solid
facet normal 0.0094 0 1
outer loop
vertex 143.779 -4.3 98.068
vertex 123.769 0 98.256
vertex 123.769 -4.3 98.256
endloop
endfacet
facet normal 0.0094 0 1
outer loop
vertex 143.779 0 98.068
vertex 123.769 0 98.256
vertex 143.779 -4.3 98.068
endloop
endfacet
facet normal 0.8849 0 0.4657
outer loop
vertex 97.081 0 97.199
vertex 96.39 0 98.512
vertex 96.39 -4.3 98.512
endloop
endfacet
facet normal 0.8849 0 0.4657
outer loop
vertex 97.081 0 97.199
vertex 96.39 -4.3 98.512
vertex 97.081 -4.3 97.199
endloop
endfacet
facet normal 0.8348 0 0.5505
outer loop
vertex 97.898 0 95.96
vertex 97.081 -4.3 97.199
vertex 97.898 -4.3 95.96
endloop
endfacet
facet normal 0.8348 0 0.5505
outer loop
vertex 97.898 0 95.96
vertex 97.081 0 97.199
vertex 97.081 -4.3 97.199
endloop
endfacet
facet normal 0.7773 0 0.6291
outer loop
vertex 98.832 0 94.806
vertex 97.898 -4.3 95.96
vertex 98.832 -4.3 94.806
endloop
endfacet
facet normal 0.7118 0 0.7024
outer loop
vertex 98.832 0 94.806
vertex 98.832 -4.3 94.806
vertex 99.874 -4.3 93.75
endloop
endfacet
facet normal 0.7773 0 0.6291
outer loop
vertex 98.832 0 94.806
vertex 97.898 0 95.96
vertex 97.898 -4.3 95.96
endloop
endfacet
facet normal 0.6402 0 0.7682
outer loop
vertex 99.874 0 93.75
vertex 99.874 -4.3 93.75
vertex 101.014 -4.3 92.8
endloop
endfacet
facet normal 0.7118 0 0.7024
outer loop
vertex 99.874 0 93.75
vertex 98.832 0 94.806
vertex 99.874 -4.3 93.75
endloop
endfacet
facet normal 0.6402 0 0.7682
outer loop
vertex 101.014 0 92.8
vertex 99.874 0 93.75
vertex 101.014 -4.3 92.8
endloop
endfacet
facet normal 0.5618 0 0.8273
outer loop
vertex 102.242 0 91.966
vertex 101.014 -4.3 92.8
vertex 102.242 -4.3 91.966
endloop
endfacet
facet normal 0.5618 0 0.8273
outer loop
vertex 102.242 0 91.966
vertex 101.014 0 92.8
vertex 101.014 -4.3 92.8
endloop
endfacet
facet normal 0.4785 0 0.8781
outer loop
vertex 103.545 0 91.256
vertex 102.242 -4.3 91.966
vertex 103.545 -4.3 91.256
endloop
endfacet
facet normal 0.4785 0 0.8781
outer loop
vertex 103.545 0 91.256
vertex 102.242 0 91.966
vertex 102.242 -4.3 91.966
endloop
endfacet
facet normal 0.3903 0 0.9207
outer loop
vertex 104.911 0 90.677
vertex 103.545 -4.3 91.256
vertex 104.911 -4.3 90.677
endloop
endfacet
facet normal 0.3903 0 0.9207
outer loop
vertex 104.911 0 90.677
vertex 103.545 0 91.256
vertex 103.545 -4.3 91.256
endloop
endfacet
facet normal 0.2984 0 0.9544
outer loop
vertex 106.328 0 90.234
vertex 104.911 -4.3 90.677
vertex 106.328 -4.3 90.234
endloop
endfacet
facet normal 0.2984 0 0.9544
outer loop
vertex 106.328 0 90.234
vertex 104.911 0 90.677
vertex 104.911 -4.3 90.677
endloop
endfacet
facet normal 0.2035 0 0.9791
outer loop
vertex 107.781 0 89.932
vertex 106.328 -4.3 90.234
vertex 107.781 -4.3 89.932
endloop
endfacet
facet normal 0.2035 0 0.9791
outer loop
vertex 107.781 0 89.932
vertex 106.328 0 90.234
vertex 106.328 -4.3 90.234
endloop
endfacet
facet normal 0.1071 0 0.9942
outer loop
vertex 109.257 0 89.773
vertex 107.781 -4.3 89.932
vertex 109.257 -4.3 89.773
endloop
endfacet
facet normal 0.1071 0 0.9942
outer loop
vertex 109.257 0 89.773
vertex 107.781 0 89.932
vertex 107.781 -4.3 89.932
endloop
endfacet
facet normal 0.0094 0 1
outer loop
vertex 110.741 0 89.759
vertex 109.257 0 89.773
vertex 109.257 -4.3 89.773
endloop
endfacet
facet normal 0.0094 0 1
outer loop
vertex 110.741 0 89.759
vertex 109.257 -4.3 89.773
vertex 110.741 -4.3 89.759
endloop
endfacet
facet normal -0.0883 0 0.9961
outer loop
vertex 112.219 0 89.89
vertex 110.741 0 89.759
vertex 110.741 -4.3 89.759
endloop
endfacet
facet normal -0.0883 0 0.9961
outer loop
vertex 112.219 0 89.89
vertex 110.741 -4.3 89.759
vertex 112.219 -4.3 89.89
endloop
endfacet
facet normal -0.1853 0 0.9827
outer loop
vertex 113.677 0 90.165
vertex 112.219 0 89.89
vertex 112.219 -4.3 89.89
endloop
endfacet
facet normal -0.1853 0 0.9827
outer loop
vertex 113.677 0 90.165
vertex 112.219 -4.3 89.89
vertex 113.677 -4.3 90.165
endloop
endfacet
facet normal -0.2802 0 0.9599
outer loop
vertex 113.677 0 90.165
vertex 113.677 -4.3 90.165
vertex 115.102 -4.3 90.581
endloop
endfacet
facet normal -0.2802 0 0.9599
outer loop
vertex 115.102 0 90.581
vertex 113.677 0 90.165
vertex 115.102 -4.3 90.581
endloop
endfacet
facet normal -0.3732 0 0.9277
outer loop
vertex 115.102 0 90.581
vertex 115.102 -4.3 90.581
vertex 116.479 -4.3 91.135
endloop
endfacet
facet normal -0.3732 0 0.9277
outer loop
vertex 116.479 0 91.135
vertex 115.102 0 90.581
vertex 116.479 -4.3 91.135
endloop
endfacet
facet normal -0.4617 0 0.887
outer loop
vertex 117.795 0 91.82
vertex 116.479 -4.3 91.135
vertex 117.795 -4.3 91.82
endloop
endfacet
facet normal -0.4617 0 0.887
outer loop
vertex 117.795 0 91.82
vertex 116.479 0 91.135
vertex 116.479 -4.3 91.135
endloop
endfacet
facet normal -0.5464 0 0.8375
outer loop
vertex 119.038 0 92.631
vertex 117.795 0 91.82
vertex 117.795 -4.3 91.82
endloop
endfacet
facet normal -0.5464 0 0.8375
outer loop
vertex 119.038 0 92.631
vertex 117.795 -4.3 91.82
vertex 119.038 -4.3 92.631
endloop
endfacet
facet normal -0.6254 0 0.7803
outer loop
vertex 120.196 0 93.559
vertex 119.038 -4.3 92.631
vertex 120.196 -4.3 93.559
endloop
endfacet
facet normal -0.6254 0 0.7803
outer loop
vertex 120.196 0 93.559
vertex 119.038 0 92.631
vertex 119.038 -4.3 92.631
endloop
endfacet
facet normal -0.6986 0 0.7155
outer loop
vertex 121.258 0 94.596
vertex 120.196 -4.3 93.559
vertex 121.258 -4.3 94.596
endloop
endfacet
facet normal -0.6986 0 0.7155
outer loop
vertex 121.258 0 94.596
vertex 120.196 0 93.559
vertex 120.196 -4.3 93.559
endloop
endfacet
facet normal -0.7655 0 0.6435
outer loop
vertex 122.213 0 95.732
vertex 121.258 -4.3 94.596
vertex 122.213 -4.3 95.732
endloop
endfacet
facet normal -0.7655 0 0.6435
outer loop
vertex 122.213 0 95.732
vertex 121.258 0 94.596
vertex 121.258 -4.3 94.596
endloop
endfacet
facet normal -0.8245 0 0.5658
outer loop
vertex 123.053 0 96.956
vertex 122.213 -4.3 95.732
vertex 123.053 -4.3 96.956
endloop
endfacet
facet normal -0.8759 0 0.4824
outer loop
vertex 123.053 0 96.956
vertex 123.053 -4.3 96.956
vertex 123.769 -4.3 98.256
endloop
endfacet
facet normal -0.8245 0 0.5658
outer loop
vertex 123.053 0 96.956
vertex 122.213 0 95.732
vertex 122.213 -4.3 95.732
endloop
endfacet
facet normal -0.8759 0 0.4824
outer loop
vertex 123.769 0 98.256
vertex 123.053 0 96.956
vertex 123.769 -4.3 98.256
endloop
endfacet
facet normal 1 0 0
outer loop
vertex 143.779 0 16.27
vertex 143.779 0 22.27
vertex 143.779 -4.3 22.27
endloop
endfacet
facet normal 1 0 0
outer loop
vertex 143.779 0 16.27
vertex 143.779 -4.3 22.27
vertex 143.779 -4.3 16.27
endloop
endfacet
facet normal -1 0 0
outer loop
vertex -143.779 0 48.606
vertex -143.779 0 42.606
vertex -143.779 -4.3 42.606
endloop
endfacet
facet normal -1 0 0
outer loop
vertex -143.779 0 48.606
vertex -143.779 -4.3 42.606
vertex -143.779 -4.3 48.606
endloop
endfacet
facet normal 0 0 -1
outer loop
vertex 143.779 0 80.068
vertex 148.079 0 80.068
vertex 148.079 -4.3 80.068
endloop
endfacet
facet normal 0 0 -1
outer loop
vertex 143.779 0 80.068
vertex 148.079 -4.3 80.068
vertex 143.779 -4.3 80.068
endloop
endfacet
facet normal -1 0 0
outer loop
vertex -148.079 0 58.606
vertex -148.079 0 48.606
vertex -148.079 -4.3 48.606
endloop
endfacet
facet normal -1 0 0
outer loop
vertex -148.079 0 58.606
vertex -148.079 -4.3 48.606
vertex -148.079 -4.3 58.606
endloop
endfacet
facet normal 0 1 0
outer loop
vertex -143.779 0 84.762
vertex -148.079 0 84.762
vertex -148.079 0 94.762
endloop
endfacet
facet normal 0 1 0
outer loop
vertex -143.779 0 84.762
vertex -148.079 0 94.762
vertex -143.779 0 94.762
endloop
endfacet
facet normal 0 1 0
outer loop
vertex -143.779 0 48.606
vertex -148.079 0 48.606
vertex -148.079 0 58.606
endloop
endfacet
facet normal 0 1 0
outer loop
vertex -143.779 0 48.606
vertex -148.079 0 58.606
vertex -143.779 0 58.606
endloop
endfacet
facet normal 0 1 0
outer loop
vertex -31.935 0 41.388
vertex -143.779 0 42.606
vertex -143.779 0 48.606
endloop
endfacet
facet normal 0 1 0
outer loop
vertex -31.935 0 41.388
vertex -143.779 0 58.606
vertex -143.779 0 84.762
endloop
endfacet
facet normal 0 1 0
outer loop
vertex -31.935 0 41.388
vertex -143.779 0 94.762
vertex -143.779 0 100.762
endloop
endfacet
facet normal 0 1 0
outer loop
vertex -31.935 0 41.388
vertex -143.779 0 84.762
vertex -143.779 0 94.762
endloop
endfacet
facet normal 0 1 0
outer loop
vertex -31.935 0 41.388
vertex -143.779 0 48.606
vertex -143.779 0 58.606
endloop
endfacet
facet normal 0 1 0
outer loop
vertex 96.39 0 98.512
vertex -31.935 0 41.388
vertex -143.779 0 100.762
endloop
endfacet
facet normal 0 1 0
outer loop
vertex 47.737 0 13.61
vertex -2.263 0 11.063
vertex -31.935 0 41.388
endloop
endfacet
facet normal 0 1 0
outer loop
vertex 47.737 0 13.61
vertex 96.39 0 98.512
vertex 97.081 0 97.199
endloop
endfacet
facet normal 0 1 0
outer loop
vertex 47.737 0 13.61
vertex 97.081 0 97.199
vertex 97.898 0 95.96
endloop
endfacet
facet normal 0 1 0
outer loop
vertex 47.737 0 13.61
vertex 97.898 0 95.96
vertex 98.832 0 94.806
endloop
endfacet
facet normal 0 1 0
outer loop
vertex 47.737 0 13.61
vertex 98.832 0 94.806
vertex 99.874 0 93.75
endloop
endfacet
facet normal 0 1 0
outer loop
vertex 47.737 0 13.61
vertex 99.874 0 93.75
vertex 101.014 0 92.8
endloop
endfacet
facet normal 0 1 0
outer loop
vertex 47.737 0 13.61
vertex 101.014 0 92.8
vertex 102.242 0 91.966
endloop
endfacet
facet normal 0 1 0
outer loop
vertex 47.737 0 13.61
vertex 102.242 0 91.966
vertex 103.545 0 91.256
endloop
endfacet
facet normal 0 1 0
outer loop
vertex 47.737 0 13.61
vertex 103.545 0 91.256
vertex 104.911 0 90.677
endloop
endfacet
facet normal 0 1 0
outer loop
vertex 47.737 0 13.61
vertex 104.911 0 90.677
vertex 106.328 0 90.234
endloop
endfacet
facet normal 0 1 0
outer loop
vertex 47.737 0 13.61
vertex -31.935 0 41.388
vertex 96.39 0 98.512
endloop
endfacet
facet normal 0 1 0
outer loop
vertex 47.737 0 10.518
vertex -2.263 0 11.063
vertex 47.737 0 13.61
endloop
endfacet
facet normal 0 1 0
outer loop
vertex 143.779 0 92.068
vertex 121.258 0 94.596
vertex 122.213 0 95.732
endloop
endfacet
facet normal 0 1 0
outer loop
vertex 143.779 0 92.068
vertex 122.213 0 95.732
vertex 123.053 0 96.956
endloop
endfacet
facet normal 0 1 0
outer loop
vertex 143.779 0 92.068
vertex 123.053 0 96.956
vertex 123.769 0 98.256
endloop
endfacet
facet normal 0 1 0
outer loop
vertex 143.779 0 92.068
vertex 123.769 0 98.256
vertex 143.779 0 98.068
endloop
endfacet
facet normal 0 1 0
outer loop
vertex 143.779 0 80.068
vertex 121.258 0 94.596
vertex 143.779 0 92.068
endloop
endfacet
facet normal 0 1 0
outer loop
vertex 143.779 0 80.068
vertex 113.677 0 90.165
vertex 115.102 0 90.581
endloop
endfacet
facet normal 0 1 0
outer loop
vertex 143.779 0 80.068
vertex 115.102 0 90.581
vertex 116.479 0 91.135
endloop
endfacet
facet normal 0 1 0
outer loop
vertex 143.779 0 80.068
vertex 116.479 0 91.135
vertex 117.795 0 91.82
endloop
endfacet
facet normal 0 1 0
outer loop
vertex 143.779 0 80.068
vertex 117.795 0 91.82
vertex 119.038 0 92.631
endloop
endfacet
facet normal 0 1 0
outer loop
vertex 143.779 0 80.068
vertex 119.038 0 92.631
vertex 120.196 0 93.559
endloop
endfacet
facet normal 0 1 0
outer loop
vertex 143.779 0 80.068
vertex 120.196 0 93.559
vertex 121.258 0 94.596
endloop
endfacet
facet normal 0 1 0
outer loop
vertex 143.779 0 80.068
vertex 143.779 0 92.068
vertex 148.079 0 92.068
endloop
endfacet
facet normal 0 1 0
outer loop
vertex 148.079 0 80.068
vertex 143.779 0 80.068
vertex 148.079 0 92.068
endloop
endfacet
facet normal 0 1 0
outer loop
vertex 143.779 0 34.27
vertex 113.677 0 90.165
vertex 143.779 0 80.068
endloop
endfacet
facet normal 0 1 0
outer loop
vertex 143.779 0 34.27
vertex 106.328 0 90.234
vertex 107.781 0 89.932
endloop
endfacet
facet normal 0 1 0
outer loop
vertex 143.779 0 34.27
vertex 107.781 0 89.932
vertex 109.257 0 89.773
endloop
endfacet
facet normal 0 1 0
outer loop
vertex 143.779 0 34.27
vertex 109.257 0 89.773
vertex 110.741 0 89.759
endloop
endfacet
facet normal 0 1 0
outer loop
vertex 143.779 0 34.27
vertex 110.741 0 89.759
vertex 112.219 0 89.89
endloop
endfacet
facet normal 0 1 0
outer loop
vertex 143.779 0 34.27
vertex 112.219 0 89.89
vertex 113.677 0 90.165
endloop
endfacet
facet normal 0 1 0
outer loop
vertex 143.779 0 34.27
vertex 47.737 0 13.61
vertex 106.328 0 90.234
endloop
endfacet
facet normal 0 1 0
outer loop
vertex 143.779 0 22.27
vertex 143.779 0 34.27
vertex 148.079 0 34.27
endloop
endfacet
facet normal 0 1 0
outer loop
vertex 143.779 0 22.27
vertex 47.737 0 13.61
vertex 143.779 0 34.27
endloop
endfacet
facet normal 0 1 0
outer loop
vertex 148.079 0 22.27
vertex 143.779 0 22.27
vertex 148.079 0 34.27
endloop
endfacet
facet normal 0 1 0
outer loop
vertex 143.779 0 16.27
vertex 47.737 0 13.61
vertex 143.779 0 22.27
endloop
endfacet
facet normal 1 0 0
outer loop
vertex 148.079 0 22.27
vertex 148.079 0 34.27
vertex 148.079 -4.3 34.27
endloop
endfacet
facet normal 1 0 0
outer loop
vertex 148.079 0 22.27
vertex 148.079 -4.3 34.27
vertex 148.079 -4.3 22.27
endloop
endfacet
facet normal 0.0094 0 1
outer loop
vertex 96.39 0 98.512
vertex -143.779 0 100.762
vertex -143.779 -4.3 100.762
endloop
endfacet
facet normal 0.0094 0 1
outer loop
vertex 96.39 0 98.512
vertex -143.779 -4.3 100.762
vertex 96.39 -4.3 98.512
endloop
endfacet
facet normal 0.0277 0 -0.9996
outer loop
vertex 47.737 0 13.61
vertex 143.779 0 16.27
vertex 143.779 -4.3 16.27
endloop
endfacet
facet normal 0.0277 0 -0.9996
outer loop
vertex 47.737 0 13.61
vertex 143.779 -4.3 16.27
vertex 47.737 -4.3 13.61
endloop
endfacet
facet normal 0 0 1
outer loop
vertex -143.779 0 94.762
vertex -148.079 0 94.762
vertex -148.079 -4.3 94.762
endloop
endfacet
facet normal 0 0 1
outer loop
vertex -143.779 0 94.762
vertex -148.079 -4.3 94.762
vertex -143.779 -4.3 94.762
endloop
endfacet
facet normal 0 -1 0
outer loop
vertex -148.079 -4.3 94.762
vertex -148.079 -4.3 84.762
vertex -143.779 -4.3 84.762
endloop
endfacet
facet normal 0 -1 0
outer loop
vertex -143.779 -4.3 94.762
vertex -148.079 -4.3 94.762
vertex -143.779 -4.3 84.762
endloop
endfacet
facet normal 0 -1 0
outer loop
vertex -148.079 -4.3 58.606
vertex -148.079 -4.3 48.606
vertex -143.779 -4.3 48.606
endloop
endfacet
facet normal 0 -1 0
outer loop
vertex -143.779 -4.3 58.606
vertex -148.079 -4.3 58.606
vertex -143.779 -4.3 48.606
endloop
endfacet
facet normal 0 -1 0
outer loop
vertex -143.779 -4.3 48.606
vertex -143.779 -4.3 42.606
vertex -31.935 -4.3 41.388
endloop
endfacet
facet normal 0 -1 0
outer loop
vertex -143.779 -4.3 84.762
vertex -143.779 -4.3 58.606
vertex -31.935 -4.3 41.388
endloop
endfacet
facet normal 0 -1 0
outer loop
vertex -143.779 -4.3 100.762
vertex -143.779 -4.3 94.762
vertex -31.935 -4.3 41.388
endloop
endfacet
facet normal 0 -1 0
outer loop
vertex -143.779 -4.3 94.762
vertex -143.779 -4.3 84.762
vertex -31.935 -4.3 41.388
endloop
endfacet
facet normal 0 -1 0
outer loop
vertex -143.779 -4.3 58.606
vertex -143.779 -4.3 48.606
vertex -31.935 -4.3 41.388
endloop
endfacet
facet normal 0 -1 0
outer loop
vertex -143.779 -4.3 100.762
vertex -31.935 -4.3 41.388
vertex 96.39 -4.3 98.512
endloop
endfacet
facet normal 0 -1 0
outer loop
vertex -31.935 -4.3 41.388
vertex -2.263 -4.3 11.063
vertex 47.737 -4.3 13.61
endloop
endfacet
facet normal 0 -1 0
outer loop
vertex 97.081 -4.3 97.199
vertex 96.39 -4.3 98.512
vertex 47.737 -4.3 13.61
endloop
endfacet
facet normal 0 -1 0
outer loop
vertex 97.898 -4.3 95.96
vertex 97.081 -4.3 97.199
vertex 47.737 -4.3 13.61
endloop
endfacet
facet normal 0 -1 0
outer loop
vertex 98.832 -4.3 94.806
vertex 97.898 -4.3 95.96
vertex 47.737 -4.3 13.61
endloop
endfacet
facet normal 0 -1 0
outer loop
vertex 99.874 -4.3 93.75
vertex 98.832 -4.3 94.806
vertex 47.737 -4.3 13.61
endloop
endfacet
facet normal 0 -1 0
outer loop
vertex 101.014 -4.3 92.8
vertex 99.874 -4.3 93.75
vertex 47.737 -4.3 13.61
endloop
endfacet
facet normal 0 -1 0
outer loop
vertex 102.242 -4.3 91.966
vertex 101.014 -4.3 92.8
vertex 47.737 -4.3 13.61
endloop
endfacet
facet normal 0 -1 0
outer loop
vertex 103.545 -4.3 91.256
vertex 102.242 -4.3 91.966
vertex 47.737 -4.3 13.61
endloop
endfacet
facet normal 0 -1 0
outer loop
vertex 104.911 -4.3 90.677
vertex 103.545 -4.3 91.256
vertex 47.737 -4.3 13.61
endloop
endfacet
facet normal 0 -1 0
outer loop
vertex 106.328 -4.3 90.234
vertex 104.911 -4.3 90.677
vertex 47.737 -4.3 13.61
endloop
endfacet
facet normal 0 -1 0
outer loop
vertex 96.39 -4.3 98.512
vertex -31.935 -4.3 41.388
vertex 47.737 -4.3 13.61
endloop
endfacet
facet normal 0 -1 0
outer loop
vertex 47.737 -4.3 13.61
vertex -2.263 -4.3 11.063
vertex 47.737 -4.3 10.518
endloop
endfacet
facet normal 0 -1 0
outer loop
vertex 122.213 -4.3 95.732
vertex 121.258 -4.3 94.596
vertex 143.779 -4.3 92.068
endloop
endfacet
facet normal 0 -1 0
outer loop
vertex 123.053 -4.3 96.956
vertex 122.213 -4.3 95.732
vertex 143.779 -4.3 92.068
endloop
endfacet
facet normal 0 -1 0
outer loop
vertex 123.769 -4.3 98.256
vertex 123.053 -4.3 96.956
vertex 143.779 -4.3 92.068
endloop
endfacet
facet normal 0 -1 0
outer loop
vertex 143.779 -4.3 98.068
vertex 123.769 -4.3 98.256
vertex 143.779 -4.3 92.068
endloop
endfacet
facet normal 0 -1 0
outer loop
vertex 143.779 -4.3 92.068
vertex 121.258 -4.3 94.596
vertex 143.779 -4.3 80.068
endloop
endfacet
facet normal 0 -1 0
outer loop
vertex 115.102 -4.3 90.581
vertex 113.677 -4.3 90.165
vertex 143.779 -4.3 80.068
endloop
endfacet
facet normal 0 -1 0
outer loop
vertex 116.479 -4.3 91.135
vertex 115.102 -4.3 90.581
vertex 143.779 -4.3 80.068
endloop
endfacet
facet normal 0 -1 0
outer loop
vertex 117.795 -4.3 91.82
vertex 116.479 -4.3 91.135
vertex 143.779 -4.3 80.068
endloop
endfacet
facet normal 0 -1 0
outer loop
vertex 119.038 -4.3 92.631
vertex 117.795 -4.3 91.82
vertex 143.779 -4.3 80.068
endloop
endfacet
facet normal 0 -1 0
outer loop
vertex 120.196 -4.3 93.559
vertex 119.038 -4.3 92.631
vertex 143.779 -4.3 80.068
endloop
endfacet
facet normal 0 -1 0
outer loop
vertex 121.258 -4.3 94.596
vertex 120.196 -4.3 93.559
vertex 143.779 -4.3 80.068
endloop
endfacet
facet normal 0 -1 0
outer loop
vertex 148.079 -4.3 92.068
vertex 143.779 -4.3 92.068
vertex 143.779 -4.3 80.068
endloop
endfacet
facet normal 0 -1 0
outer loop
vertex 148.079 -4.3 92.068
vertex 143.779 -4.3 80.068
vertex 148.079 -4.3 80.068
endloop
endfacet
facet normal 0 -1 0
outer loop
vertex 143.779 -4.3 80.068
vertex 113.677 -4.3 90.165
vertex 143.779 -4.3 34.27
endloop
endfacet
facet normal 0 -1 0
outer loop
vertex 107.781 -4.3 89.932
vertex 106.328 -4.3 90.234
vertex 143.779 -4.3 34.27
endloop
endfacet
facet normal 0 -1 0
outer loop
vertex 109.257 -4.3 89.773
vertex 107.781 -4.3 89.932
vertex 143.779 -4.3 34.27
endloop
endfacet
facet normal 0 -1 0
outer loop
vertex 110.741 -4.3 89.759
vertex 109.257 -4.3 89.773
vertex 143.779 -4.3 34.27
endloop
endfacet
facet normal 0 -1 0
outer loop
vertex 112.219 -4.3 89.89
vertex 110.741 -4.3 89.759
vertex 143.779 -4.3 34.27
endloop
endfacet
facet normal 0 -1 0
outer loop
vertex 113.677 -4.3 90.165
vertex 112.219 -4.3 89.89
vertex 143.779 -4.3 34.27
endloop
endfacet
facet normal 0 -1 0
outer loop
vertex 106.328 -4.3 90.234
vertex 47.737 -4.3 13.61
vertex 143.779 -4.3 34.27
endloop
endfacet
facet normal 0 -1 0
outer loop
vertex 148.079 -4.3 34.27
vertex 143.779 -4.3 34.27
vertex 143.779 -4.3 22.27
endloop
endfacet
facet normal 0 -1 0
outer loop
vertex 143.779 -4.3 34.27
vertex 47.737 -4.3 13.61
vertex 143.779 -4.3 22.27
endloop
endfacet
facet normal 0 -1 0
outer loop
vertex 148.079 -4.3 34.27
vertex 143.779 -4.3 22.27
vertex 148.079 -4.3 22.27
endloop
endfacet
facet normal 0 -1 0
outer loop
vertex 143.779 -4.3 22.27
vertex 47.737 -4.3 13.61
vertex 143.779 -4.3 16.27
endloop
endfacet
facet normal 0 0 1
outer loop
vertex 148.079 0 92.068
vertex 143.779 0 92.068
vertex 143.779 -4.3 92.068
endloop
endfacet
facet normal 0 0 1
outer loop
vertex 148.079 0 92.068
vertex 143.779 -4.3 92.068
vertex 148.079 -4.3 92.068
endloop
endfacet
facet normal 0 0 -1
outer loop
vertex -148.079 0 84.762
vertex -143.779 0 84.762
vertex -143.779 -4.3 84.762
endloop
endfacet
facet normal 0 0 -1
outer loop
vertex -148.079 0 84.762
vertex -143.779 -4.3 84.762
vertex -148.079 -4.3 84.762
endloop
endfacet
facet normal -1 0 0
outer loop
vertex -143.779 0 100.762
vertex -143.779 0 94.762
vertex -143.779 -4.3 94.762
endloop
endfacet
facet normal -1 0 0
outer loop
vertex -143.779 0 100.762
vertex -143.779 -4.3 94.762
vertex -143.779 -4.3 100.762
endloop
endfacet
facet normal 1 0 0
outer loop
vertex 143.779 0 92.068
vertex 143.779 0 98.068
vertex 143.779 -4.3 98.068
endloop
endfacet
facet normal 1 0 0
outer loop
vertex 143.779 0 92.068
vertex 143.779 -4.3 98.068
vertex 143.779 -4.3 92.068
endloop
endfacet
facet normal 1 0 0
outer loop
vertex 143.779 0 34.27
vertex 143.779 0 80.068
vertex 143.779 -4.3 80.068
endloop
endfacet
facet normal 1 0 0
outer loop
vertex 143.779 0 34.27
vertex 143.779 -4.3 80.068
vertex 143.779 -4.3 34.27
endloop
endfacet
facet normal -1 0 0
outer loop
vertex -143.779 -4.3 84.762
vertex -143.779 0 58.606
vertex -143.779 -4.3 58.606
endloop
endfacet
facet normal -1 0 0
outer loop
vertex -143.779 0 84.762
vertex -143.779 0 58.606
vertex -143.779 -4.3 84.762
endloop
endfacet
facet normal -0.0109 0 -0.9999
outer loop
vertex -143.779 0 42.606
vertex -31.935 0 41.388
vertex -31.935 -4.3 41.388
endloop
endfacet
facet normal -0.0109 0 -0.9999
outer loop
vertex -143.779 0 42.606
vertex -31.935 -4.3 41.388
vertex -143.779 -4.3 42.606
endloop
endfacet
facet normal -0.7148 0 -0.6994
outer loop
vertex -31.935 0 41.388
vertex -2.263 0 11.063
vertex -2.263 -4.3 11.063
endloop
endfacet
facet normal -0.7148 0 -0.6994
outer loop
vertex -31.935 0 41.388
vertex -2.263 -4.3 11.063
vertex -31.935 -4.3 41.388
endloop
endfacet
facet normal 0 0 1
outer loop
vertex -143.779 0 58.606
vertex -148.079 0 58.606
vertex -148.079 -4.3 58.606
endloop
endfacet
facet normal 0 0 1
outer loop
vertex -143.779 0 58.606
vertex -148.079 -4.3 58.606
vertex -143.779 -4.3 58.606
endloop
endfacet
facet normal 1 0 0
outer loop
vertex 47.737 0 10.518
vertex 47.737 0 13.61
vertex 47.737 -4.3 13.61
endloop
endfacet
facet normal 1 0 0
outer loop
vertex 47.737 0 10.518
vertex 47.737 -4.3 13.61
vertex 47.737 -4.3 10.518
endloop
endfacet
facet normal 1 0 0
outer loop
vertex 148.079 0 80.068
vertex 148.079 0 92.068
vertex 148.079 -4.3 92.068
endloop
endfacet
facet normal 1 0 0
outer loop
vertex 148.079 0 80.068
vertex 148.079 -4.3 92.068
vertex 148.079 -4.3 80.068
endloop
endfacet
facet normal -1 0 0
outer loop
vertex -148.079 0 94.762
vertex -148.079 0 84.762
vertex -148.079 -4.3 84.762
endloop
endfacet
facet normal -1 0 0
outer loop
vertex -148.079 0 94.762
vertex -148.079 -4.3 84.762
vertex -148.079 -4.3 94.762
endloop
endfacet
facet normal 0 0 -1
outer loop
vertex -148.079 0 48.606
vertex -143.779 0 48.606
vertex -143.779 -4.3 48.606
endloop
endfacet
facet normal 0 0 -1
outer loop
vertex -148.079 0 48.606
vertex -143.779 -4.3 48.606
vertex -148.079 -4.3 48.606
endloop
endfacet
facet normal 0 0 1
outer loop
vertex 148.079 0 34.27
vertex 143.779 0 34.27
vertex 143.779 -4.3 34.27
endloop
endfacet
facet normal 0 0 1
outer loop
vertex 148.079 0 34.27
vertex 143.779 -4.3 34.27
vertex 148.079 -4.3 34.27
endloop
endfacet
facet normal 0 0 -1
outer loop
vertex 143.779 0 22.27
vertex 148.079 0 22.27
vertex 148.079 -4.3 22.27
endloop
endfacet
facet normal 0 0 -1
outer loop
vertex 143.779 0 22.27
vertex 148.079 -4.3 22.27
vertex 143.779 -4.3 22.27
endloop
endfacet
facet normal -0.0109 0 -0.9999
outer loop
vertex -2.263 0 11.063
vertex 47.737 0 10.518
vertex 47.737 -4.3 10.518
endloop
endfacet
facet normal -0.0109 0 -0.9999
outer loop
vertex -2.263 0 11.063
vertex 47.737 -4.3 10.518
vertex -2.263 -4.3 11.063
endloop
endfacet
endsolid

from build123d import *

# Parameters (mm, degrees)
BOSS_EXTRUDE1_DEPTH = 4.3


with BuildPart() as part:
    # Sketch4 → Boss-Extrude1 (new body)
    with BuildSketch(Plane(origin=(0, 0, 0), x_dir=(1, 0, 0), z_dir=(0, 1, 0))):
        with BuildLine():
            Line((47.736880922, -13.610395438), (47.736880922, -10.518490221))
            Line((47.736880922, -10.518490221), (-2.263119078, -11.062941575))
            Line((-2.263119078, -11.062941575), (-31.934689225, -41.387814618))
            Line((-31.934689225, -41.387814618), (-143.77908283, -42.60569125))
            Line((-143.77908283, -42.60569125), (-143.77908283, -48.60569125))
            Line((-143.77908283, -48.60569125), (-148.07908283, -48.60569125))
            Line((-148.07908283, -48.60569125), (-148.07908283, -58.60569125))
            Line((-148.07908283, -58.60569125), (-143.77908283, -58.60569125))
            Line((-143.77908283, -58.60569125), (-143.77908283, -84.761876256))
            Line((-143.77908283, -84.761876256), (-148.07908283, -84.761876256))
            Line((-148.07908283, -84.761876256), (-148.07908283, -94.761876256))
            Line((-148.07908283, -94.761876256), (-143.77908283, -94.761876256))
            Line((-143.77908283, -94.761876256), (-143.77908283, -100.761876256))
            Line((-143.77908283, -100.761876256), (96.389605884, -98.512277012))
            ThreePointArc((96.389605884, -98.512277012), (109.998414099, -89.747620618), (123.769012787, -98.255821046))
            Line((123.769012787, -98.255821046), (143.77908283, -98.068391791))
            Line((143.77908283, -98.068391791), (143.77908283, -92.068391791))
            Line((143.77908283, -92.068391791), (148.07908283, -92.068391791))
            Line((148.07908283, -92.068391791), (148.07908283, -80.068391791))
            Line((148.07908283, -80.068391791), (143.77908283, -80.068391791))
            Line((143.77908283, -80.068391791), (143.77908283, -34.269759798))
            Line((143.77908283, -34.269759798), (148.07908283, -34.269759798))
            Line((148.07908283, -34.269759798), (148.07908283, -22.269759798))
            Line((148.07908283, -22.269759798), (143.77908283, -22.269759798))
            Line((143.77908283, -22.269759798), (143.77908283, -16.269759798))
            Line((143.77908283, -16.269759798), (47.736880922, -13.610395438))
        make_face()
    extrude(amount=-BOSS_EXTRUDE1_DEPTH)


solid = part.part
